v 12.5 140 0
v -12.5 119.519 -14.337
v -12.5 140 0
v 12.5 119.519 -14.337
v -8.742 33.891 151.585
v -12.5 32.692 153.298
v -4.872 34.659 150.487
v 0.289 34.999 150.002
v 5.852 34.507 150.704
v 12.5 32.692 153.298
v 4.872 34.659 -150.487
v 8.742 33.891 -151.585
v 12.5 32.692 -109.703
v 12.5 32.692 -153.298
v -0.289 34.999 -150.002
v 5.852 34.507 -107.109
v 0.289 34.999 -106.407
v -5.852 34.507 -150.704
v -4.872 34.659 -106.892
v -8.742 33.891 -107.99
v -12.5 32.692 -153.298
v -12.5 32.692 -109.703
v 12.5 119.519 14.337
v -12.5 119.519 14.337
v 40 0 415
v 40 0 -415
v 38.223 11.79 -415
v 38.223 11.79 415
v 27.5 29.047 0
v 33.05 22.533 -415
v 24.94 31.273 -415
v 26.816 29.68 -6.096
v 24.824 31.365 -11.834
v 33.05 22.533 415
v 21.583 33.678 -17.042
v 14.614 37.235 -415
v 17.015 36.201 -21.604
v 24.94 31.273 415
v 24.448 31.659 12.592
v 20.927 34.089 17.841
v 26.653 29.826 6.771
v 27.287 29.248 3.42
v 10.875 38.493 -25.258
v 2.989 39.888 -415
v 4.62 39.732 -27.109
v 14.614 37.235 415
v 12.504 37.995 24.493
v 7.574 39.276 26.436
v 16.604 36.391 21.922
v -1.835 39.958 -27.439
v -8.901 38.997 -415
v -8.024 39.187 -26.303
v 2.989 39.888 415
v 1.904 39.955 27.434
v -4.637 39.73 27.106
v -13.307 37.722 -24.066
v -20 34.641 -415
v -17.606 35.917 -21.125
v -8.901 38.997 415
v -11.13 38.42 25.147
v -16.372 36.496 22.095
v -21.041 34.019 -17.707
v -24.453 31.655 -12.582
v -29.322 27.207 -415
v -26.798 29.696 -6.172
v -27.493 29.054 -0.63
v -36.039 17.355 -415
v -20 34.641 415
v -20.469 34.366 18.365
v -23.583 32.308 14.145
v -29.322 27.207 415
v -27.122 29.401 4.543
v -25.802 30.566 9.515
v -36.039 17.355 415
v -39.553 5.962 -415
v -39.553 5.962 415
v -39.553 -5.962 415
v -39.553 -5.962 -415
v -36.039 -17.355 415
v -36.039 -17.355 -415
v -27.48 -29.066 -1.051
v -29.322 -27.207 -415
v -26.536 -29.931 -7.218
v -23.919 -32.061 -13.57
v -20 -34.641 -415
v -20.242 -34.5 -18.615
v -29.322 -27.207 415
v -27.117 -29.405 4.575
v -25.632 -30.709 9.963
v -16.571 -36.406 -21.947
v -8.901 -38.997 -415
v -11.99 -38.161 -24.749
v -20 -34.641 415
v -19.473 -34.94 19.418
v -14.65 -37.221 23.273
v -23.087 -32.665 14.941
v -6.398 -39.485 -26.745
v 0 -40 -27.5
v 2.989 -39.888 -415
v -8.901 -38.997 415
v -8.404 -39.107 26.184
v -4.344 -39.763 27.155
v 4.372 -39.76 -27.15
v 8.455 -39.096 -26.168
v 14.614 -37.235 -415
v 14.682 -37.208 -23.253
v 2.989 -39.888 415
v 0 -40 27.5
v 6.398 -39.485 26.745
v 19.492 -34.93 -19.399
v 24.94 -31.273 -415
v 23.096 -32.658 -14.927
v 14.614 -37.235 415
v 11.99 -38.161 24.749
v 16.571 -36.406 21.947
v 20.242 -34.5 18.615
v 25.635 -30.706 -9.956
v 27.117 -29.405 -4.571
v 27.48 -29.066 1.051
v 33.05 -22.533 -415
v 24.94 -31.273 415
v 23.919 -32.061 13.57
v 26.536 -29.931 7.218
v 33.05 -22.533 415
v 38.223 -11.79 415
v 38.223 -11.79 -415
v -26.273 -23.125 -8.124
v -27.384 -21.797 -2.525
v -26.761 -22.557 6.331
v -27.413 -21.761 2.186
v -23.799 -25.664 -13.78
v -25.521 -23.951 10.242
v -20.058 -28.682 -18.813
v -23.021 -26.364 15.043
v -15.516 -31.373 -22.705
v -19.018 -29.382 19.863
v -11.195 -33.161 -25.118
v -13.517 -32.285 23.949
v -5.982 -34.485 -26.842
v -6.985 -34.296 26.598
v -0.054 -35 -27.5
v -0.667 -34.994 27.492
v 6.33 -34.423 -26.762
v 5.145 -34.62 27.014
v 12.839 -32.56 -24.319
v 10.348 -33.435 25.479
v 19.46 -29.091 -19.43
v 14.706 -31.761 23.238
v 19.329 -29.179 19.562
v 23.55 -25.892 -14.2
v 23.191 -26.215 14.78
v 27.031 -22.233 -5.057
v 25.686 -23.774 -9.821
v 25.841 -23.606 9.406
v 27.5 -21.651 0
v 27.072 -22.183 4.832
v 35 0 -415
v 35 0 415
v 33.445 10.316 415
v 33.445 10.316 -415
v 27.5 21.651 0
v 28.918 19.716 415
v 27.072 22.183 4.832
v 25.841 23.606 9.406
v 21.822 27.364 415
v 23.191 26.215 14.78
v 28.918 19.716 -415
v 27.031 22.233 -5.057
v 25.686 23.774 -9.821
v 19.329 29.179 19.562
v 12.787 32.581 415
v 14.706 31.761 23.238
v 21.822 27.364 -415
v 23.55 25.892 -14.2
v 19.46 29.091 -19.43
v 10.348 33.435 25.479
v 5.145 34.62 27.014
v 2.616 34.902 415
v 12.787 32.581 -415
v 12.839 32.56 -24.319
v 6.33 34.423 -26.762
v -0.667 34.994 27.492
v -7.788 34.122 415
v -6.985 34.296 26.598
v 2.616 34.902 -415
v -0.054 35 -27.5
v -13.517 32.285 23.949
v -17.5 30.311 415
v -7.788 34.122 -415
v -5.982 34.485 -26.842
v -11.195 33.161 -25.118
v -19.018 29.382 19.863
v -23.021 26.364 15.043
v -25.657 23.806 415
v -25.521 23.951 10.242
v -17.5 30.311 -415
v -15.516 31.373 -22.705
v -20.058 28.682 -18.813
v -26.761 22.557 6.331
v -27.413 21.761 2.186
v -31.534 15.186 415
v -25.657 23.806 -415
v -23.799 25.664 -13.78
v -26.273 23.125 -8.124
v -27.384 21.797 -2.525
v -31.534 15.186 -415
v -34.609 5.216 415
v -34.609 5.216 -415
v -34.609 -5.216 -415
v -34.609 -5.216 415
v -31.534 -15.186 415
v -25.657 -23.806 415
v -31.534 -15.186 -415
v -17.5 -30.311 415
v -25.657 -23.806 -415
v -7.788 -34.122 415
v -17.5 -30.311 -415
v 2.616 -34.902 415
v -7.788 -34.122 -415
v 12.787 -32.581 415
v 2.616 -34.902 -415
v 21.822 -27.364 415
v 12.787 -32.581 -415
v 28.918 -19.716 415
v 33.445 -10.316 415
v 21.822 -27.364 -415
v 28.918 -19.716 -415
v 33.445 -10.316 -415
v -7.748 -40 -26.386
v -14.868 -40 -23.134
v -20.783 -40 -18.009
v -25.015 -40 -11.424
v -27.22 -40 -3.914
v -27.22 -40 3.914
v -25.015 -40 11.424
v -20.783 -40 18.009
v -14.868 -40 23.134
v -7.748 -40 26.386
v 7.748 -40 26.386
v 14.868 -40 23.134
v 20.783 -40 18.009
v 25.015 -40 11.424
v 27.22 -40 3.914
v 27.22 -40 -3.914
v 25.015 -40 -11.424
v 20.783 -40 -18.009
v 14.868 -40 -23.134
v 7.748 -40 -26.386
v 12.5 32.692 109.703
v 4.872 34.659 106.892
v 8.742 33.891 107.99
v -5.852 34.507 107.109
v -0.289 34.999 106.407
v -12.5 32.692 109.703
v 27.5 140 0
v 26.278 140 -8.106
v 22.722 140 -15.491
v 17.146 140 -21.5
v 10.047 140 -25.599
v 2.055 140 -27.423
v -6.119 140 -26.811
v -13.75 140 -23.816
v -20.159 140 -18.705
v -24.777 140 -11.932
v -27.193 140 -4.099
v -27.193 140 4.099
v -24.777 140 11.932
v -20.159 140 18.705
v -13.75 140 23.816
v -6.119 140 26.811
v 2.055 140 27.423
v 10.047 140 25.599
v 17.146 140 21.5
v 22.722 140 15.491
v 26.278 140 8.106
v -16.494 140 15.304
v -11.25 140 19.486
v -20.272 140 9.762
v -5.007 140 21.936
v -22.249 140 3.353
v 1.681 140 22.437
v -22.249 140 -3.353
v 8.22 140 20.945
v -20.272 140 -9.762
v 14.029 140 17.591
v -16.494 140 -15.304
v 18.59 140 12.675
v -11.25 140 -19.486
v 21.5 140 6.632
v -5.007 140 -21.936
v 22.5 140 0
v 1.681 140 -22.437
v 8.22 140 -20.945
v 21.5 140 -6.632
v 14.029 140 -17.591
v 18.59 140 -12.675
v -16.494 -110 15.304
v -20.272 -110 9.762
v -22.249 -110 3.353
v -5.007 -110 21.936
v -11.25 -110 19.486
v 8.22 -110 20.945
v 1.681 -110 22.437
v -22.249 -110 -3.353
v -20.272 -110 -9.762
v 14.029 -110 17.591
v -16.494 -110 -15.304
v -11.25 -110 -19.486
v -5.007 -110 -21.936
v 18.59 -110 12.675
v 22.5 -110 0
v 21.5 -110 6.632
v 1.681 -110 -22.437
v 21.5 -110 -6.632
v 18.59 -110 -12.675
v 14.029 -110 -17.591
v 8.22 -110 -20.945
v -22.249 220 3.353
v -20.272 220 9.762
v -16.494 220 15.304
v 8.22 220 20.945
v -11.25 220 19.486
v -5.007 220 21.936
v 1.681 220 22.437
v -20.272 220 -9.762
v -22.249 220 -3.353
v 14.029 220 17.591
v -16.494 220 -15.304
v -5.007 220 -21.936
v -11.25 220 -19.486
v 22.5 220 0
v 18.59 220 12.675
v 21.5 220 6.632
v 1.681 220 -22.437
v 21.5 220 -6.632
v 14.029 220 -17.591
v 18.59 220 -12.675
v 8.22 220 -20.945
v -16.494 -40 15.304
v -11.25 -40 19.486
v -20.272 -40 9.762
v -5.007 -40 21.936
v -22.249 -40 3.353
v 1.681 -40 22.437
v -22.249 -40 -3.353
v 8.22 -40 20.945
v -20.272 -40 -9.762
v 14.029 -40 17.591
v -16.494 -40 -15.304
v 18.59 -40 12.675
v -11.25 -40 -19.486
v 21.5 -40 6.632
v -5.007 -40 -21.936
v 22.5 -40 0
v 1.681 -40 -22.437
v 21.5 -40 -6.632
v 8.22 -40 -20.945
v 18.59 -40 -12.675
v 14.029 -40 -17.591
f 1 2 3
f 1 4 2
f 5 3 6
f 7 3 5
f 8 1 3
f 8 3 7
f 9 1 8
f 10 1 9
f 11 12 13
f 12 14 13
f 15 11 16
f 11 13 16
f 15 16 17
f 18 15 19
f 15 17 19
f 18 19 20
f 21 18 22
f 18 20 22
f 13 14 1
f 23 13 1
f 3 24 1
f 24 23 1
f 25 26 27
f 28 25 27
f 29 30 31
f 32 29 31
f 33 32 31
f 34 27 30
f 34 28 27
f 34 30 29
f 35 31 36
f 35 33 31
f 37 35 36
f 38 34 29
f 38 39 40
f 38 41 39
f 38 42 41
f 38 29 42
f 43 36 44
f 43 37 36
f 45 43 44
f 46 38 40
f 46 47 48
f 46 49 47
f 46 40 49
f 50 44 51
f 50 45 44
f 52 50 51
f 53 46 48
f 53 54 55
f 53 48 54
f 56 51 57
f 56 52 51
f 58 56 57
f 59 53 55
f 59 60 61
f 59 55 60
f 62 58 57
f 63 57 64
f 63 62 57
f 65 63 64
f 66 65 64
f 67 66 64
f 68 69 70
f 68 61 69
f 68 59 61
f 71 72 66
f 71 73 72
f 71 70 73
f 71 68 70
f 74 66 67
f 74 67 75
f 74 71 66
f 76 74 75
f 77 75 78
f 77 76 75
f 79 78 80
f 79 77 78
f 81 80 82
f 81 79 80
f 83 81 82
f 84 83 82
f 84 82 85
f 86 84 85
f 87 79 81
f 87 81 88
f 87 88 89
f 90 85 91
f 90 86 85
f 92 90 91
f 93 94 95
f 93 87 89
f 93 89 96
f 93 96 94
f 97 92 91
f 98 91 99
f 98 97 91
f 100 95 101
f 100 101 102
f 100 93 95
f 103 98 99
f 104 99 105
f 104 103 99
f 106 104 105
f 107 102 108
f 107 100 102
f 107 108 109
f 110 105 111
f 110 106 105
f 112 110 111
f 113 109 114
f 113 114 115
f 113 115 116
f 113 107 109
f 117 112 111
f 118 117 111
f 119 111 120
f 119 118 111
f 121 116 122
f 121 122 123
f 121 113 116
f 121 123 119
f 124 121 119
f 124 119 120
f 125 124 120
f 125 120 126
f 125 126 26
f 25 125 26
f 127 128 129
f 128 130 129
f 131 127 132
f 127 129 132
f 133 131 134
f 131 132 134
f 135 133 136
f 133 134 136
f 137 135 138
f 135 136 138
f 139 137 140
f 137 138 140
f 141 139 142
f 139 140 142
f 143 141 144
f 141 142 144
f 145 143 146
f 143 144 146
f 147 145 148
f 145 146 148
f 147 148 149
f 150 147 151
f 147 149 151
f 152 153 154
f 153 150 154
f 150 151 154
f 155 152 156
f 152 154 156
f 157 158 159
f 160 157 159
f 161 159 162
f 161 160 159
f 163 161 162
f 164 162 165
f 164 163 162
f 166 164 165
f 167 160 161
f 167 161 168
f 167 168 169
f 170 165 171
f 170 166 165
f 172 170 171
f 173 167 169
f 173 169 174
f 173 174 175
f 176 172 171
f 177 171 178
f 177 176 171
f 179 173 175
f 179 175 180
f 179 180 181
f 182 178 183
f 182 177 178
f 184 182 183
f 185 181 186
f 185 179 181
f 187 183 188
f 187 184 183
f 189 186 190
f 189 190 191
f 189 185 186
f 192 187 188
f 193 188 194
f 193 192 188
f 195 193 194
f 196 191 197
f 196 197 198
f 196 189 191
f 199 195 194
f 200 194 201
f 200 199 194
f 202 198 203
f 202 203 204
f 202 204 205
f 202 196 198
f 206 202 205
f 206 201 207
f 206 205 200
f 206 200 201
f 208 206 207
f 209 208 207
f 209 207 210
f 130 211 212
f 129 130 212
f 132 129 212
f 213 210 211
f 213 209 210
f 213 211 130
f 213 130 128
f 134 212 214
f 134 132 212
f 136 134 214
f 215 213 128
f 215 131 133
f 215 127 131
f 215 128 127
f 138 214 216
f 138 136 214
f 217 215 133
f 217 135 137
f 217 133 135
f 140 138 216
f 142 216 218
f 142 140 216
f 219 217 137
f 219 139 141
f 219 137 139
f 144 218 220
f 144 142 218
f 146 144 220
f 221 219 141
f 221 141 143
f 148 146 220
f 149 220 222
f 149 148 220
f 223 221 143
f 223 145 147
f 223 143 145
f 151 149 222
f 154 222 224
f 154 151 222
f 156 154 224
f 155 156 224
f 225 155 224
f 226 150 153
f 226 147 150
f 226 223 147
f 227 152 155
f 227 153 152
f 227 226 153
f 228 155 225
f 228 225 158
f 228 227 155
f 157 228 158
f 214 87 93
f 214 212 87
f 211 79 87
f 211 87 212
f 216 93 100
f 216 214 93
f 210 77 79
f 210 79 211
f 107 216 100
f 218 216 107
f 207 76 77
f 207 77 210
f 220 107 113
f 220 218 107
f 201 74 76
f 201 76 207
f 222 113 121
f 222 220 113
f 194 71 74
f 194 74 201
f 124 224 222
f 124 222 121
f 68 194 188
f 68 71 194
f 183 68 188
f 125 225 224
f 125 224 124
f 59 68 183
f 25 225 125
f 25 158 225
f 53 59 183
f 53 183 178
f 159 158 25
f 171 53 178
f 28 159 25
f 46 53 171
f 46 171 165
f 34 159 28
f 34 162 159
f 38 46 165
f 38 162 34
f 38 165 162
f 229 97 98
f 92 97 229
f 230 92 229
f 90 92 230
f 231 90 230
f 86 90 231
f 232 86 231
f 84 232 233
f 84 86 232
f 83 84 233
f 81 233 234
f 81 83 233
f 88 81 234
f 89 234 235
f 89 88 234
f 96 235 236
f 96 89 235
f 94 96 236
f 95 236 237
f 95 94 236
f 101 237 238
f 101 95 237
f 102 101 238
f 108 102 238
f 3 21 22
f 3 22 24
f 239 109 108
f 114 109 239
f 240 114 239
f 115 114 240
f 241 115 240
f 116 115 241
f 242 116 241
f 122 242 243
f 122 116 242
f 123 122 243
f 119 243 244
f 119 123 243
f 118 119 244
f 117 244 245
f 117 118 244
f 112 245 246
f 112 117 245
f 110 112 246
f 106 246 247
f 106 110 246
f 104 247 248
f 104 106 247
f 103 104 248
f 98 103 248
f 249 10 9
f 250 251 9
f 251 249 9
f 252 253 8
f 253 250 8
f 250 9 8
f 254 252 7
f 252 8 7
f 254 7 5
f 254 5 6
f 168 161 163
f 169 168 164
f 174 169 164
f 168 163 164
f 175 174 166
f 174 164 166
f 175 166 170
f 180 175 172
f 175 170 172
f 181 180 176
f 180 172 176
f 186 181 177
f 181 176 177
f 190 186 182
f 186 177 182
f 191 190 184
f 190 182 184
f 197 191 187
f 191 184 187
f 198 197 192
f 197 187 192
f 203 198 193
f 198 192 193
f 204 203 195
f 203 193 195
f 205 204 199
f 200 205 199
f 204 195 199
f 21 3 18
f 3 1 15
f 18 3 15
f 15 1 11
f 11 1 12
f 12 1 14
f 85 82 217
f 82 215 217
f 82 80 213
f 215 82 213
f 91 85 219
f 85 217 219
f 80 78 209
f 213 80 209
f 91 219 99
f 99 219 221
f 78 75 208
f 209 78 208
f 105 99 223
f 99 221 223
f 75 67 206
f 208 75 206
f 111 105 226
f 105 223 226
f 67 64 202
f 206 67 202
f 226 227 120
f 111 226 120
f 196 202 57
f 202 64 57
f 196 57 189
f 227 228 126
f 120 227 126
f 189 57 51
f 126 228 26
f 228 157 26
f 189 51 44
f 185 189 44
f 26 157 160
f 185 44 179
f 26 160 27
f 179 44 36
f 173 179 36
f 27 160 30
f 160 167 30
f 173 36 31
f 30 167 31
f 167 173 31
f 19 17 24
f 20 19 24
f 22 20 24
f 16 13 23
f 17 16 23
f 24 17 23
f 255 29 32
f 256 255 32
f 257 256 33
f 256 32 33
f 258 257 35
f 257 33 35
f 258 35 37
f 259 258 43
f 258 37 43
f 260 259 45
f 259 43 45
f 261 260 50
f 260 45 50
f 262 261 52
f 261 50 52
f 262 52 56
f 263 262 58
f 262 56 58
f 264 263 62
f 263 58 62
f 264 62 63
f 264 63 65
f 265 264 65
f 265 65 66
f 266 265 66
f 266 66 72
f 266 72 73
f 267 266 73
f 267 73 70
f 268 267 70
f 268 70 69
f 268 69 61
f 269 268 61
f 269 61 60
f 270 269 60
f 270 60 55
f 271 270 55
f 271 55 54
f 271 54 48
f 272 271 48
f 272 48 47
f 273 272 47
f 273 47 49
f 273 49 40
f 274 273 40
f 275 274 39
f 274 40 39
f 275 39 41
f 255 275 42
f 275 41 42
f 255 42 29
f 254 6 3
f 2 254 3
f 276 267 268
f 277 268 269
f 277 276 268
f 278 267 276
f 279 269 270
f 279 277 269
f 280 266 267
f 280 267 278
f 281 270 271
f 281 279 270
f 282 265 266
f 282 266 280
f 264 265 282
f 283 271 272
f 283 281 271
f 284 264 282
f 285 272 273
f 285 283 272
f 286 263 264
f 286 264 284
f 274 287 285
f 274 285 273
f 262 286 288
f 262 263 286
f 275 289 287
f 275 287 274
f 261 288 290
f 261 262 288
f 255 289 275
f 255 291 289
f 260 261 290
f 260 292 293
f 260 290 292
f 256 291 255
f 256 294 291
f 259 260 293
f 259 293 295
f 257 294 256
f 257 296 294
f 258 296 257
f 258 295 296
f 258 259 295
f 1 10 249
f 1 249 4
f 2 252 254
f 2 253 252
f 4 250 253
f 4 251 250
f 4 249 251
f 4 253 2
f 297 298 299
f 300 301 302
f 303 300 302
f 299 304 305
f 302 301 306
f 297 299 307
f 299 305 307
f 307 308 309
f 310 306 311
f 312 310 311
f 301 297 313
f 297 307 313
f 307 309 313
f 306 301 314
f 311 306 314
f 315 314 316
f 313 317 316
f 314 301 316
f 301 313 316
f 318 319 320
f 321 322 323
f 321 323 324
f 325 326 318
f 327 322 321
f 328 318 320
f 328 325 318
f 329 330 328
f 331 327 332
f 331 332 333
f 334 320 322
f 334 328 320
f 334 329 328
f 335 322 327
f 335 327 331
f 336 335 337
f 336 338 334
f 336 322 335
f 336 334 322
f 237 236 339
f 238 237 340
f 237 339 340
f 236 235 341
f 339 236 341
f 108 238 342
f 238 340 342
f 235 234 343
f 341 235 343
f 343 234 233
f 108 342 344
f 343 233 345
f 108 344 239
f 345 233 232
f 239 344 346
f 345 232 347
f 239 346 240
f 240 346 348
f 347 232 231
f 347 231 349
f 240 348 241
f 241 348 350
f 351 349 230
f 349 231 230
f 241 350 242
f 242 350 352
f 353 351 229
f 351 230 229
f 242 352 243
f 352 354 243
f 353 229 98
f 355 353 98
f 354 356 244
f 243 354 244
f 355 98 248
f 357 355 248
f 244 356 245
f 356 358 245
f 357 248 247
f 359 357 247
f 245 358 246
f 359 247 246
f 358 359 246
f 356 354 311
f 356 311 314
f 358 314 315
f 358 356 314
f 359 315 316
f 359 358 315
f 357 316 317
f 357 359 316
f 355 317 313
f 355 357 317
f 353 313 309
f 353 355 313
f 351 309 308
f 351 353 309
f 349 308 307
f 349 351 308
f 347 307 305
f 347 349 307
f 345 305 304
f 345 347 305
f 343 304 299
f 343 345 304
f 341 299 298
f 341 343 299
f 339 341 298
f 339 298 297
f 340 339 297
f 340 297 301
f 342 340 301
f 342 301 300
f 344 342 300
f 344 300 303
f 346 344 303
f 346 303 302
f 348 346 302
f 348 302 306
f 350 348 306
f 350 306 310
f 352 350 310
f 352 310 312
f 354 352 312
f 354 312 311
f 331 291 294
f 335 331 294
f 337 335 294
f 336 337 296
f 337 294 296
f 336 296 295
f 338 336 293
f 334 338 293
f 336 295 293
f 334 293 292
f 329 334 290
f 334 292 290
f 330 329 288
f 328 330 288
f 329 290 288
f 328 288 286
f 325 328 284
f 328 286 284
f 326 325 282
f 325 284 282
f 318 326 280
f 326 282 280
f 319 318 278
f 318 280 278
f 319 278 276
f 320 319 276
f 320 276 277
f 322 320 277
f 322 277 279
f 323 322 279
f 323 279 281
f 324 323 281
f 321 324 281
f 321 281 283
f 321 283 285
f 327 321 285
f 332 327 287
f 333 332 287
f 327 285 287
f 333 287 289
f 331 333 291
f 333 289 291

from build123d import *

# Parameters (mm, degrees)
SKETCH1_R                = 40
SKETCH1_R_2              = 35
EXTRUDE_THIN1_DEPTH      = 415
SKETCH2_R                = 27.5
SKETCH2_R_2              = 22.5
EXTRUDE_THIN3_DEPTH      = 140
EXTRUDE_THIN3_DEPTH_BACK = 40
SKETCH3_R                = 22.5
BOSS_EXTRUDE1_DEPTH      = 80
BOSS_EXTRUDE1_DEPTH_BACK = 250
EXTRUDE_THIN4_DEPTH      = 12.5
SKETCH6_R                = 35
CUT_EXTRUDE1_DEPTH       = 831.0000001


with BuildPart() as part:
    # Sketch1 → Extrude-Thin1 (new body, symmetric)
    with BuildSketch(Plane.XY):
        Circle(SKETCH1_R)
        Circle(SKETCH1_R_2, mode=Mode.SUBTRACT)
    extrude(amount=EXTRUDE_THIN1_DEPTH, both=True)

    # Sketch2 → Extrude-Thin3 (add, two sides)
    with BuildSketch(Plane(origin=(0, 0, 0), x_dir=(1, 0, 0), z_dir=(0, 1, 0))) as extrude_thin3_sk:
        Circle(SKETCH2_R)
        Circle(SKETCH2_R_2, mode=Mode.SUBTRACT)
    extrude(amount=EXTRUDE_THIN3_DEPTH)
    extrude(extrude_thin3_sk.sketch, amount=-EXTRUDE_THIN3_DEPTH_BACK)

    # Sketch3 → Boss-Extrude1 (add, two sides)
    with BuildSketch(Plane(origin=(0, 140, 0), x_dir=(1, 0, 0), z_dir=(0, 1, 0))) as boss_extrude1_sk:
        Circle(SKETCH3_R)
    extrude(amount=BOSS_EXTRUDE1_DEPTH)
    extrude(boss_extrude1_sk.sketch, amount=-BOSS_EXTRUDE1_DEPTH_BACK)


with BuildPart() as body_2:
    # Sketch4 → Extrude-Thin4 (new body, symmetric)
    with BuildSketch(Plane(origin=(0, 0, 0), x_dir=(0, 0, -1), z_dir=(1, 0, 0))):
        Polygon((0, 140), (-200, 0), (-185.663441391, -20.480798013), (14.336558609, 119.519201987), align=None)
    extrude(amount=EXTRUDE_THIN4_DEPTH, both=True)


with BuildPart() as body_3:
    # Mirror2: mirrored copy
    add(body_2.part.mirror(Plane.XY))


with BuildPart() as cut_extrude1_tool:
    # Sketch6 → Cut-Extrude1 (new body, through all)
    with BuildSketch(Plane.XY.offset(415)):
        Circle(SKETCH6_R)
    extrude(amount=-CUT_EXTRUDE1_DEPTH)


with BuildPart() as part_1:
    add(part.part)

    # Cut-Extrude1: cut by cut_extrude1_tool
    add(cut_extrude1_tool.part, mode=Mode.SUBTRACT)


with BuildPart() as body_2_1:
    add(body_2.part)

    # Cut-Extrude1: cut by cut_extrude1_tool
    add(cut_extrude1_tool.part, mode=Mode.SUBTRACT)


with BuildPart() as body_3_1:
    add(body_3.part)

    # Cut-Extrude1: cut by cut_extrude1_tool
    add(cut_extrude1_tool.part, mode=Mode.SUBTRACT)


solid = Compound([part_1.part, body_2_1.part, body_3_1.part])
